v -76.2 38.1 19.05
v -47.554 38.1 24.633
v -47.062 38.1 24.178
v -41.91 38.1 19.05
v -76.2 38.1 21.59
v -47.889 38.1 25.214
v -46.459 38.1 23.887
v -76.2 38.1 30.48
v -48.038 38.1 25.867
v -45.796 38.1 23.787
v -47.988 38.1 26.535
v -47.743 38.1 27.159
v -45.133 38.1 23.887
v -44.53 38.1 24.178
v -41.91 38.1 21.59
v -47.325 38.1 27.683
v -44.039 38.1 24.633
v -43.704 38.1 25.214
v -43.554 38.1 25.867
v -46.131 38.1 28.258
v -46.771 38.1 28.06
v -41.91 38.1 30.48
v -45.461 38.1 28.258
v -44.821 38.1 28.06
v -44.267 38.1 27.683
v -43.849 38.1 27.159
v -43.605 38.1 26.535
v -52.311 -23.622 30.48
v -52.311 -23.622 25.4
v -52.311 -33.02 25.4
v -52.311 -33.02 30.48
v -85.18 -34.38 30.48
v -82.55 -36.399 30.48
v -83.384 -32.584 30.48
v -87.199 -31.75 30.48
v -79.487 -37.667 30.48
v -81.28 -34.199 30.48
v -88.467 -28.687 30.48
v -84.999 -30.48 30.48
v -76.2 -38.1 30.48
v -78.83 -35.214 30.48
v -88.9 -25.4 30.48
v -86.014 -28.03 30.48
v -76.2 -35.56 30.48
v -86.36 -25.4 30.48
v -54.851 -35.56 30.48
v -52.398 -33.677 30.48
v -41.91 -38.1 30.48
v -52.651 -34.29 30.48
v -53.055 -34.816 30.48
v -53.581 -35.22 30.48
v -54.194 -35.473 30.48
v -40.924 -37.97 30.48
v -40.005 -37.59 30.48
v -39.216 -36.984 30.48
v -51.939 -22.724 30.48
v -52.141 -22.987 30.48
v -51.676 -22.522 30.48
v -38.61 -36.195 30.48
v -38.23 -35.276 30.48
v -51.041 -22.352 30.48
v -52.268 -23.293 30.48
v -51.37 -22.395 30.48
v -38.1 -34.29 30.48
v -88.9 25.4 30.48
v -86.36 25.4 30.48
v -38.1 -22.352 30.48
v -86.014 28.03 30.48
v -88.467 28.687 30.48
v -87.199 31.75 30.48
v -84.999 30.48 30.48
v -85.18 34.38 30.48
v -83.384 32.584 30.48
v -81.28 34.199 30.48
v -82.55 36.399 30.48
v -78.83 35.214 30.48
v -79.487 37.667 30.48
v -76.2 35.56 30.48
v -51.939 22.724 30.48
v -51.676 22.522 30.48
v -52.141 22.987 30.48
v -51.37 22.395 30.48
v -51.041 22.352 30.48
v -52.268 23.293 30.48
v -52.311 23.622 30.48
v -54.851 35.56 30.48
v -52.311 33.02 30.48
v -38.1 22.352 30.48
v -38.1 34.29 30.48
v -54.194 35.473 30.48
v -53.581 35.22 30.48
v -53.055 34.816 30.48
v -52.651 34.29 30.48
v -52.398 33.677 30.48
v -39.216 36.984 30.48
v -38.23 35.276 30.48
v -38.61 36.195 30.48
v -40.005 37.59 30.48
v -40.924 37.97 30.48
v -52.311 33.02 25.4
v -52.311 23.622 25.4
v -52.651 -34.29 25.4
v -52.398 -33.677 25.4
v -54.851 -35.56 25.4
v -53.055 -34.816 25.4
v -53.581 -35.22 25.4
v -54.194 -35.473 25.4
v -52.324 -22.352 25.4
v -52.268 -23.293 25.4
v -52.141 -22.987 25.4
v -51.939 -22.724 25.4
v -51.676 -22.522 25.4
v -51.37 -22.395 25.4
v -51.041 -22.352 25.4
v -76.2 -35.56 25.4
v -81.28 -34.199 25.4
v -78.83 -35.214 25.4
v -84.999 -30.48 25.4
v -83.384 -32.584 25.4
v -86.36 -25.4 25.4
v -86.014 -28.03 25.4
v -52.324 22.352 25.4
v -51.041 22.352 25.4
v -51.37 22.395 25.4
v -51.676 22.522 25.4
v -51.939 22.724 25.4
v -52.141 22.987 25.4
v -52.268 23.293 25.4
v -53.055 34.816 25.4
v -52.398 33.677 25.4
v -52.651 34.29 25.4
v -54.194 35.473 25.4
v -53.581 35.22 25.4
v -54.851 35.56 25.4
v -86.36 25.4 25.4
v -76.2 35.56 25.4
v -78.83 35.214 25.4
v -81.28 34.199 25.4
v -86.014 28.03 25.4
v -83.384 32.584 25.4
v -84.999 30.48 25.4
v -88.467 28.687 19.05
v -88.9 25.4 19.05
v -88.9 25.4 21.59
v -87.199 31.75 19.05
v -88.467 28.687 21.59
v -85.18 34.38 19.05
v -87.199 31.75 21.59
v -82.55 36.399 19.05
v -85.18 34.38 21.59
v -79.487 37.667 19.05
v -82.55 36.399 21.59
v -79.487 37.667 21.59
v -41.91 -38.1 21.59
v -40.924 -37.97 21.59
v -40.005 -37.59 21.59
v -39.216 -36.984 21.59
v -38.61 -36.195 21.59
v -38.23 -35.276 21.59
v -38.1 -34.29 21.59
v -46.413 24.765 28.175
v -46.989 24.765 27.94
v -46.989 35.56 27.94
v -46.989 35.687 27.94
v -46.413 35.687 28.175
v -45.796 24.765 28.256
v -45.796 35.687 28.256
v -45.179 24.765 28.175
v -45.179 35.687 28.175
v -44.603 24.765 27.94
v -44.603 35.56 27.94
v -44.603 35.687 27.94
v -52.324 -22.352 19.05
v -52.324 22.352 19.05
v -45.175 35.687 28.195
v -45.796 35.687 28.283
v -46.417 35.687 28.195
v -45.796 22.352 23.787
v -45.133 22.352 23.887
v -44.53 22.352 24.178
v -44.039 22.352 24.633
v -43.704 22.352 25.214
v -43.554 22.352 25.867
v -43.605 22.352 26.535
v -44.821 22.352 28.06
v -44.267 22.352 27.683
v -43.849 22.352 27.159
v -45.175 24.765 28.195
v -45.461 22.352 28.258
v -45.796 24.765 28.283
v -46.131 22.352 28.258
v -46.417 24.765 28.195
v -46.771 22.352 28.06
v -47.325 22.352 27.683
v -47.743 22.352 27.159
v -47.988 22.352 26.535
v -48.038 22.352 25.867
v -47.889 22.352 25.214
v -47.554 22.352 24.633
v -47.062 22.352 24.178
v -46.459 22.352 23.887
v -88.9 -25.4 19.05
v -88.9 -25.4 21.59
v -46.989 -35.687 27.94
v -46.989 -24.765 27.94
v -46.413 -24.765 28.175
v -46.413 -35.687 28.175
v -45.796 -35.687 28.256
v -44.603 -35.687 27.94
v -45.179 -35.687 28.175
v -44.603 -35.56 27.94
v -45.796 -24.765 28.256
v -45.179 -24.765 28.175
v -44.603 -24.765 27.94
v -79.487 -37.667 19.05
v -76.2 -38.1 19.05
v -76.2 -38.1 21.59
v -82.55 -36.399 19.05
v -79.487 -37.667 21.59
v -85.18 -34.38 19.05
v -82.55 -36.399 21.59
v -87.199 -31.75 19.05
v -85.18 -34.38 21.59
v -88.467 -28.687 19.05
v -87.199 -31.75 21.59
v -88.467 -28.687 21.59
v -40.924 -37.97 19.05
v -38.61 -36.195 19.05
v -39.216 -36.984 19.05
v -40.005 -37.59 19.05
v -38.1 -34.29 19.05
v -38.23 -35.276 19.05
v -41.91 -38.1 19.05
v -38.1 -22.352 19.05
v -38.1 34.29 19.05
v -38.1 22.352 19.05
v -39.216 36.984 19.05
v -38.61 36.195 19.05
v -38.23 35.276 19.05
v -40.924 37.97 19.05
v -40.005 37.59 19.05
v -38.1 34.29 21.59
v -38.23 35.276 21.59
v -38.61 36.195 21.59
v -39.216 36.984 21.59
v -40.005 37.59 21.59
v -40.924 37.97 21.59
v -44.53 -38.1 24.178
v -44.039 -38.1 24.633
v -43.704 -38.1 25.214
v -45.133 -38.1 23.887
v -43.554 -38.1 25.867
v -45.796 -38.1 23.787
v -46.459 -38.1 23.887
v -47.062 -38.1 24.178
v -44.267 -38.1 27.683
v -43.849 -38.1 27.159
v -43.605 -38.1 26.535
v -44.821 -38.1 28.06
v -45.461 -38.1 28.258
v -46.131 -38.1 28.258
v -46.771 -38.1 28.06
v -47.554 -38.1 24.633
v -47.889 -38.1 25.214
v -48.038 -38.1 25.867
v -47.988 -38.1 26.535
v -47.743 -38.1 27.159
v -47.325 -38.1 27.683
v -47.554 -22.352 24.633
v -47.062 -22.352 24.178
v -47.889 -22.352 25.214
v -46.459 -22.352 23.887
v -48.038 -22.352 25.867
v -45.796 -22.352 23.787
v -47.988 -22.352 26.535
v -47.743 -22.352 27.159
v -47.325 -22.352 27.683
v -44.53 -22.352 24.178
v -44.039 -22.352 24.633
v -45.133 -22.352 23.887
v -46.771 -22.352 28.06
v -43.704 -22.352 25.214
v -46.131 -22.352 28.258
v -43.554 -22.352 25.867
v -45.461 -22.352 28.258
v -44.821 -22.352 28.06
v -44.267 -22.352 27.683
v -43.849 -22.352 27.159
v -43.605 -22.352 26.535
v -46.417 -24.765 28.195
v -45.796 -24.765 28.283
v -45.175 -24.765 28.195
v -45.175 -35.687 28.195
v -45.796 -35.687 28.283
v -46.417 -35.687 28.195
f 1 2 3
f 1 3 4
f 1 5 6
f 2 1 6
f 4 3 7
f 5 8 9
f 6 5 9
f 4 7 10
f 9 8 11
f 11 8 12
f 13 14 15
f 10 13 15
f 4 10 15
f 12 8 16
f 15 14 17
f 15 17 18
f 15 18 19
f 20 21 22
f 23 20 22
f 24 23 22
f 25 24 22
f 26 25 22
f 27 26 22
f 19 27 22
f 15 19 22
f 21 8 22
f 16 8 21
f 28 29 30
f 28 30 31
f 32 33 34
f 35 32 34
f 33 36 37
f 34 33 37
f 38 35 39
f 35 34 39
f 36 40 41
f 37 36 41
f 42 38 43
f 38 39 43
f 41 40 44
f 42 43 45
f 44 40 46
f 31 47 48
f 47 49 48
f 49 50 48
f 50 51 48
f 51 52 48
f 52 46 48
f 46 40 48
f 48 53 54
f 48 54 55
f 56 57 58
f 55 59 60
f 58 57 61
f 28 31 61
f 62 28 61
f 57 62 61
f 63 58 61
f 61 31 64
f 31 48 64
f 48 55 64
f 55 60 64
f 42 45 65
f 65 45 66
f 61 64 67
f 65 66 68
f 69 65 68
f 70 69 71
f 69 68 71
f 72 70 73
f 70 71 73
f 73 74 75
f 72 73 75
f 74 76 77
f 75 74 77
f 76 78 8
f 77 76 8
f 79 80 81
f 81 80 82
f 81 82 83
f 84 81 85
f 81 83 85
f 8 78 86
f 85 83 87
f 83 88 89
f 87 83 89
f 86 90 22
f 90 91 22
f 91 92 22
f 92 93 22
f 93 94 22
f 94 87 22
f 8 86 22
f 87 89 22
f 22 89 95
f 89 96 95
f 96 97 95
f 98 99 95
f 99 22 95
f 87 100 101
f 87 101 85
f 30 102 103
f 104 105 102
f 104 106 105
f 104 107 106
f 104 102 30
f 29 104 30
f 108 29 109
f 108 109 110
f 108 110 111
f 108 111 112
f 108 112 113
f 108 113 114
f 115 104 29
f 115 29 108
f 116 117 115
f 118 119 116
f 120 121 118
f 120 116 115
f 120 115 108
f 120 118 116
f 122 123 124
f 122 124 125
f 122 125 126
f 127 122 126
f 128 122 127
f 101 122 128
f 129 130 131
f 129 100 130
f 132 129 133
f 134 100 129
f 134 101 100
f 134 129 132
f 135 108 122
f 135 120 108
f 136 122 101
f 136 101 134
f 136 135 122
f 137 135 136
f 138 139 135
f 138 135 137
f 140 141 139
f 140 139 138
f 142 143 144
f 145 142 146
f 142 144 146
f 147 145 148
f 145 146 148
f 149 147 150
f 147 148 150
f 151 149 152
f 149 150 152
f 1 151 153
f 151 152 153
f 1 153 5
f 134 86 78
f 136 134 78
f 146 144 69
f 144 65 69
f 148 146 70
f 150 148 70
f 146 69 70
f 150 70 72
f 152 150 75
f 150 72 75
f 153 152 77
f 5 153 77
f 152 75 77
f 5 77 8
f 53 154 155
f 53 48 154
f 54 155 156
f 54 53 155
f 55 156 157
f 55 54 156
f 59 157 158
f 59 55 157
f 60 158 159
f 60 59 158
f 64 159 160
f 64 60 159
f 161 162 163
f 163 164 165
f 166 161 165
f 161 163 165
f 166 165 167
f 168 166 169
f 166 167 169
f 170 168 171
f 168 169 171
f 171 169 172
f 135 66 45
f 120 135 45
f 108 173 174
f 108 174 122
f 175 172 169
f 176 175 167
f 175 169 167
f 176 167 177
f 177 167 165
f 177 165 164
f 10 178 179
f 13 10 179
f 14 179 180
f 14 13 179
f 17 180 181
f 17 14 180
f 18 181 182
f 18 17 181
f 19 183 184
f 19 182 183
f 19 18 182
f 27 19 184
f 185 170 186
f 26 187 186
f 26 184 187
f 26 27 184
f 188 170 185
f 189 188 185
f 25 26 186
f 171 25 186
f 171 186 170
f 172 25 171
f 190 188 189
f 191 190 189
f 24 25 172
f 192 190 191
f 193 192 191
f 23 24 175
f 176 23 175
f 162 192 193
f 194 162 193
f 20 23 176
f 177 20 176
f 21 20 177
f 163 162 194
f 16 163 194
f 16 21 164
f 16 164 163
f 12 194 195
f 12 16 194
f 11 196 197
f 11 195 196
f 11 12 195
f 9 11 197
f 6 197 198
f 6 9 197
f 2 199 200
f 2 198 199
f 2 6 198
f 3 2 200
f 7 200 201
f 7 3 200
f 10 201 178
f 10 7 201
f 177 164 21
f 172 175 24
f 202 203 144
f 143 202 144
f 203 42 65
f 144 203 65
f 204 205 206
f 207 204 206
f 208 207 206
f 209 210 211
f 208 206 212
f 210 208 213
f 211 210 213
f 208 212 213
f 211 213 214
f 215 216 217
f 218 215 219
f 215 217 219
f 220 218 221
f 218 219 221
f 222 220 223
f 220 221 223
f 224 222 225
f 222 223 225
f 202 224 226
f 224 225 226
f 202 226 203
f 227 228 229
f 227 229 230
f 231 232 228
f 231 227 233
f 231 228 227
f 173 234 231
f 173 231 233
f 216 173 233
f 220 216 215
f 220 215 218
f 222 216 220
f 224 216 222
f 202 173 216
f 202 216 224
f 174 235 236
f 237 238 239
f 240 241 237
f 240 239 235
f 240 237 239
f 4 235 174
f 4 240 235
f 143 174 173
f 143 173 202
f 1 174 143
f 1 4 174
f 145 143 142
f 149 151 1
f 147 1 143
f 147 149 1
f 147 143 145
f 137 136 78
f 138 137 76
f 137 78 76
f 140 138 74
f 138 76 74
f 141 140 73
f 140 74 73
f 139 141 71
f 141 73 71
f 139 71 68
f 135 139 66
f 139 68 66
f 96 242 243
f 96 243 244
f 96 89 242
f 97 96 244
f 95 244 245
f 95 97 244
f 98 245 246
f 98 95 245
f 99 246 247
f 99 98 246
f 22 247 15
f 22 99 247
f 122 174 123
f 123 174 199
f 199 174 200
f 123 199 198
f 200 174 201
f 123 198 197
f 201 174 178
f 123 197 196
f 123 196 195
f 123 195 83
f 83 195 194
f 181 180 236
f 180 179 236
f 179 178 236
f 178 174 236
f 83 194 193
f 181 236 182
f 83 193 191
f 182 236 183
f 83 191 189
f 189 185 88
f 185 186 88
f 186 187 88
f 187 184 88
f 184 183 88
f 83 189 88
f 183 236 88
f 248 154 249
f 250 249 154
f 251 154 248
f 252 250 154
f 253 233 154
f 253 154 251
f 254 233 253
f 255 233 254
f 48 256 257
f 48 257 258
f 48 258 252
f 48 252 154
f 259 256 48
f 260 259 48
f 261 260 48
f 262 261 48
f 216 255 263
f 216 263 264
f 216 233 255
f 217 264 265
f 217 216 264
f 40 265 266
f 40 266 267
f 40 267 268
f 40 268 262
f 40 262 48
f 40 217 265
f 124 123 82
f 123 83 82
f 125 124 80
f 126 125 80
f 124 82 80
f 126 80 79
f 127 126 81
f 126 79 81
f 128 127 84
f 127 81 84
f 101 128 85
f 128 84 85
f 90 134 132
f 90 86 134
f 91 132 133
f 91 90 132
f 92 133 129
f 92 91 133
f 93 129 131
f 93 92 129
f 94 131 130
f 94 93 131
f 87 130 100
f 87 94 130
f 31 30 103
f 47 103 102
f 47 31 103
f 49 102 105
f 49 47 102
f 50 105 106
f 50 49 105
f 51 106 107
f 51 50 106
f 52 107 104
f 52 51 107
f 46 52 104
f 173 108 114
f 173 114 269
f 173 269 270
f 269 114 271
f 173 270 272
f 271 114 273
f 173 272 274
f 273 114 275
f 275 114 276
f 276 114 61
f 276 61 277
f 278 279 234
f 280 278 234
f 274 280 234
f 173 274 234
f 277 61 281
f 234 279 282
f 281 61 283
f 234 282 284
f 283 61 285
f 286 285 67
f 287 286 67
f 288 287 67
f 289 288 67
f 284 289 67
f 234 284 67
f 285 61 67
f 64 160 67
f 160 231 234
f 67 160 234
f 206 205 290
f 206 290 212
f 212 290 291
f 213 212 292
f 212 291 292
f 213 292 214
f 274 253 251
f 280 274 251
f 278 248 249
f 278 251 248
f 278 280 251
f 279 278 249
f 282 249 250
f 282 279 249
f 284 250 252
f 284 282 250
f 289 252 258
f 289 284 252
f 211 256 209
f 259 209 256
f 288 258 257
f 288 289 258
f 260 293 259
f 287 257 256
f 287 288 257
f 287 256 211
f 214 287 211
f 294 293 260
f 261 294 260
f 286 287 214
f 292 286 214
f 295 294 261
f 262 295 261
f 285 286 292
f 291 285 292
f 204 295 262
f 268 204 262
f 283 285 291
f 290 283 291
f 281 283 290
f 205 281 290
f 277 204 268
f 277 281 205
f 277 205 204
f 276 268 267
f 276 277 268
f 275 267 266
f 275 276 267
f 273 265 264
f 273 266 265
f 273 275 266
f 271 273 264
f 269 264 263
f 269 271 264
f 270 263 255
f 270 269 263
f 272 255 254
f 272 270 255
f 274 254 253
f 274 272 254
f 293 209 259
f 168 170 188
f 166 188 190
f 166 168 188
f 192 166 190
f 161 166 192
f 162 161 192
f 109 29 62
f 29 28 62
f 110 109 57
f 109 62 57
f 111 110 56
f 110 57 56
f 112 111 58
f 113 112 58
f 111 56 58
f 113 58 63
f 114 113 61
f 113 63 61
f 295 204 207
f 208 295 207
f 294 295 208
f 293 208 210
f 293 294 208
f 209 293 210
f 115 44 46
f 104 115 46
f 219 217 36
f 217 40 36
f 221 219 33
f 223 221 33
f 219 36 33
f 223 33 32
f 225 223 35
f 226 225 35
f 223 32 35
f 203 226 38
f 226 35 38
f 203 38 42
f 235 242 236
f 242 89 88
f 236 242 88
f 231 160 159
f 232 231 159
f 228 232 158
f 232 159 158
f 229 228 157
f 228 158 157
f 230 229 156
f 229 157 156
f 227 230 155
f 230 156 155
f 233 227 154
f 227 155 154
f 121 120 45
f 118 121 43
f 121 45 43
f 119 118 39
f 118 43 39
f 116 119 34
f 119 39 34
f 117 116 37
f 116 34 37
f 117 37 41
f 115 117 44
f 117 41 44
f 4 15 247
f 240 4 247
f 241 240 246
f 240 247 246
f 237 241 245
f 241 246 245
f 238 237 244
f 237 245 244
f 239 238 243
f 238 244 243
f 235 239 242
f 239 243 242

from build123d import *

# Parameters (mm, degrees)
SKETCH1_W                = 114.3
SKETCH1_H                = 44.45
BOSS_EXTRUDE1_DEPTH      = 62.23
SKETCH2_W                = 114.3
SKETCH2_H                = 30.050000124
CUT_EXTRUDE2_DEPTH       = 31.75
SKETCH3_W                = 114.3
SKETCH3_H                = 31.75
CUT_EXTRUDE3_DEPTH       = 21.59
CUT_EXTRUDE6_REACH       = 97.47
SKETCH7_R                = 4.8
CUT_EXTRUDE7_DEPTH       = 70.051688068
CUT_EXTRUDE7_DEPTH_BACK  = 70.051688068
SKETCH9_W                = 44.45
SKETCH9_H                = 30.050000124
CUT_EXTRUDE8_DEPTH       = 96.469879543
BOSS_EXTRUDE2_REACH      = 92.305
SKETCH14_W               = 21.59
SKETCH14_H               = 5.500000062
SKETCH17_W               = 44.45
SKETCH17_H               = 5.500000062
BOSS_EXTRUDE3_DEPTH      = 8.89
SKETCH20_W               = 50.8
SKETCH20_H               = 76.2
BOSS_EXTRUDE5_DEPTH      = 8.89
FILLET4_R                = 12.7
CUT_EXTRUDE10_DEPTH      = 2.54
CUT_EXTRUDE11_DEPTH      = 124.171316568
CUT_EXTRUDE11_DEPTH_BACK = 124.171316568
SKETCH22_R               = 4.8
SKETCH25_W               = 10.312122602
SKETCH25_H               = 7.199999938
CUT_EXTRUDE14_DEPTH      = 17.272
SKETCH26_W               = 10.312122602
SKETCH26_H               = 7.199999938
CUT_EXTRUDE15_DEPTH      = 17.272
CUT_EXTRUDE16_DEPTH      = 121.990414496
CUT_EXTRUDE16_DEPTH_BACK = 121.990414496
SKETCH32_R               = 2.2479
FILLET5_R                = 3.81
CUT_EXTRUDE22_DEPTH      = 98.128019129
BOSS_EXTRUDE6_DEPTH      = 10.922
BOSS_EXTRUDE7_START      = 10.922
BOSS_EXTRUDE7_DEPTH      = 10.922
BOSS_EXTRUDE8_DEPTH      = 2.54
CUT_EXTRUDE23_DEPTH      = 2.54
BOSS_EXTRUDE10_DEPTH     = 1.143
BOSS_EXTRUDE13_START     = -2.54
BOSS_EXTRUDE13_DEPTH     = 2.54
SKETCH59_W               = 5.08
SKETCH59_H               = 13.208
BOSS_EXTRUDE16_DEPTH     = 1.3589
FILLET6_R                = 2.54
FILLET7_R                = 1.27


with BuildPart() as part:
    # Sketch1 → Boss-Extrude1 (new body)
    with BuildSketch(Plane.XY):
        Rectangle(SKETCH1_W, SKETCH1_H)
    extrude(amount=BOSS_EXTRUDE1_DEPTH)

    # Sketch2 → Cut-Extrude2 (cut)
    with BuildSketch(Plane.XY.offset(62.23)):
        Rectangle(SKETCH2_W, SKETCH2_H)
    extrude(amount=-CUT_EXTRUDE2_DEPTH, mode=Mode.SUBTRACT)

    # Sketch3 → Cut-Extrude3 (cut)
    with BuildSketch(Plane(origin=(0, 0, 0), x_dir=(-1, 0, 0), z_dir=(0, 0, -1))):
        with Locations((0, 6.35)):
            Rectangle(SKETCH3_W, SKETCH3_H)
    extrude(amount=-CUT_EXTRUDE3_DEPTH, mode=Mode.SUBTRACT)

    # Cut-Extrude6: up to this face of the body (flat: up to its plane)
    cut_extrude6_end = Plane(part.part.faces().sort_by_distance((0, 22.225, 41.91))[0])
    # Sketch7 → Cut-Extrude6 (cut, up to the picked face)
    with BuildSketch(Plane.XZ.offset(22.225), mode=Mode.PRIVATE) as cut_extrude6_sk1:
        with Locations((31.75, 50.36)):
            Circle(SKETCH7_R)
    cut_extrude6_tool1 = split(extrude(cut_extrude6_sk1.sketch, amount=-CUT_EXTRUDE6_REACH, mode=Mode.PRIVATE), bisect_by=cut_extrude6_end, keep=Keep.BOTH, mode=Mode.PRIVATE)
    # Sketch7 → Cut-Extrude6 (cut, up to the picked face)
    with BuildSketch(Plane.XZ.offset(22.225), mode=Mode.PRIVATE) as cut_extrude6_sk2:
        with Locations((-27.14, 39.37)):
            Circle(SKETCH7_R)
    cut_extrude6_tool2 = split(extrude(cut_extrude6_sk2.sketch, amount=-CUT_EXTRUDE6_REACH, mode=Mode.PRIVATE), bisect_by=cut_extrude6_end, keep=Keep.BOTH, mode=Mode.PRIVATE)
    add(cut_extrude6_tool1.solids().sort_by(Axis((31.75, -22.225, 50.36), (0, 1, 0)))[0], mode=Mode.SUBTRACT)
    add(cut_extrude6_tool2.solids().sort_by(Axis((-27.14, -22.225, 39.37), (0, 1, 0)))[0], mode=Mode.SUBTRACT)

    # Sketch9 → Cut-Extrude7 (cut, two sides: drawn at the far end of the back side and taken through both)
    with BuildSketch(Plane.XY.offset(30.48).offset(-CUT_EXTRUDE7_DEPTH_BACK)):
        with Locations((-15.875, 0)):
            Rectangle(SKETCH9_W, SKETCH9_H)
    extrude(amount=CUT_EXTRUDE7_DEPTH + CUT_EXTRUDE7_DEPTH_BACK, mode=Mode.SUBTRACT)

    # Sketch16 → Cut-Extrude8 (cut, through all)
    with BuildSketch(Plane.XZ.offset(22.225)):
        with BuildLine():
            Line((-57.15, 62.23), (57.15, 62.23))
            Line((57.15, 62.23), (57.15, 47.010251521))
            Line((57.15, 47.010251521), (41.63, 50.36))
            ThreePointArc((41.63, 50.36), (31.75, 60.24), (21.87, 50.36))
            Line((21.87, 50.36), (-15.99, 39.37))
            ThreePointArc((-15.99, 39.37), (-26.807602145, 50.515044265), (-38.270181465, 40.034500235))
            ThreePointArc((-38.270181465, 40.034500235), (-41.445282487, 33.244816513), (-48.412122602, 30.48))
            Line((-48.412122602, 30.48), (-57.15, 30.48))
            Line((-57.15, 30.48), (-57.15, 62.23))
        make_face()
    extrude(amount=-CUT_EXTRUDE8_DEPTH, mode=Mode.SUBTRACT)

    # Sketch14 → Boss-Extrude2 (add, up to next)
    with BuildSketch(Plane.ZY.offset(-6.35), mode=Mode.PRIVATE) as boss_extrude2_sk1:
        with Locations((10.795, -12.275000031)):
            Rectangle(SKETCH14_W, SKETCH14_H)
    boss_extrude2_tool1 = extrude(boss_extrude2_sk1.sketch, amount=BOSS_EXTRUDE2_REACH, mode=Mode.PRIVATE) - part.part
    add(boss_extrude2_tool1.solids().sort_by_distance((6.35, -12.275, 10.795))[0])

    # Sketch17 → Boss-Extrude3 (add)
    with BuildSketch(Plane.XY.offset(21.59)):
        with Locations((-15.875, -12.275000031)):
            Rectangle(SKETCH17_W, SKETCH17_H)
    extrude(amount=BOSS_EXTRUDE3_DEPTH)

    # Sketch20 → Boss-Extrude5 (add)
    with BuildSketch(Plane(origin=(0, 0, 21.59), x_dir=(-1, 0, 0), z_dir=(0, 0, -1))):
        with Locations((63.5, 0)):
            Rectangle(SKETCH20_W, SKETCH20_H)
    extrude(amount=-BOSS_EXTRUDE5_DEPTH)

    # Fillet4
    fillet4_edges = [part.edges().sort_by_distance(p)[0] for p in [
        (-88.9, 38.1, 26.035),
        (-88.9, -38.1, 26.035),
    ]]
    fillet(fillet4_edges, radius=FILLET4_R)

    # Sketch21 → Cut-Extrude10 (cut)
    with BuildSketch(Plane.XY.offset(30.48)):
        with BuildLine():
            Line((-76.2, -35.56), (-40.64, -35.56))
            Line((-40.64, -35.56), (-40.64, -24.765))
            Line((-40.64, -24.765), (-50.952122602, -24.765))
            Line((-50.952122602, -24.765), (-50.952122602, -12.485000062))
            Line((-50.952122602, -12.485000062), (-40.64, -12.485000062))
            Line((-40.64, -12.485000062), (-40.64, -12.065))
            Line((-40.64, -12.065), (-40.64, 12.485000062))
            Line((-40.64, 12.485000062), (-50.952122602, 12.485000062))
            Line((-50.952122602, 12.485000062), (-50.952122602, 24.765))
            Line((-50.952122602, 24.765), (-40.64, 24.765))
            Line((-40.64, 24.765), (-40.64, 35.56))
            Line((-40.64, 35.56), (-76.2, 35.56))
            ThreePointArc((-76.2, 35.56), (-83.384204897, 32.584204897), (-86.36, 25.4))
            Line((-86.36, 25.4), (-86.36, -25.4))
            ThreePointArc((-86.36, -25.4), (-83.384204897, -32.584204897), (-76.2, -35.56))
        make_face()
    extrude(amount=-CUT_EXTRUDE10_DEPTH, mode=Mode.SUBTRACT)

    # Sketch22 → Cut-Extrude11 (cut, two sides: drawn at the far end of the back side and taken through both)
    with BuildSketch(Plane.XZ.offset(22.225).offset(-CUT_EXTRUDE11_DEPTH_BACK)):
        with BuildLine():
            Line((-38.1, 30.48), (-38.270181465, 40.034500235))
            ThreePointArc((-38.270181465, 40.034500235), (-26.807602145, 50.515044265), (-15.99, 39.37))
            Line((-15.99, 39.37), (21.87, 50.36))
            ThreePointArc((21.87, 50.36), (31.75, 60.24), (41.63, 50.36))
            Line((41.63, 50.36), (57.15, 47.010251521))
            Line((57.15, 47.010251521), (57.15, 0))
            Line((57.15, 0), (-57.15, 0))
            Line((-57.15, 0), (-57.15, 21.59))
            Line((-57.15, 21.59), (-38.1, 21.59))
            Line((-38.1, 21.59), (-38.1, 30.48))
        make_face()
        with Locations((31.75, 50.36)):
            Circle(SKETCH22_R, mode=Mode.SUBTRACT)
        with Locations((-27.14, 39.37)):
            Circle(SKETCH22_R, mode=Mode.SUBTRACT)
    extrude(amount=CUT_EXTRUDE11_DEPTH + CUT_EXTRUDE11_DEPTH_BACK, mode=Mode.SUBTRACT)

    # Sketch25 → Cut-Extrude14 (cut)
    with BuildSketch(Plane.XY.offset(30.48)):
        with Locations((-43.256061301, -18.625000031)):
            Rectangle(SKETCH25_W, SKETCH25_H)
    extrude(amount=CUT_EXTRUDE14_DEPTH, mode=Mode.SUBTRACT)

    # Sketch26 → Cut-Extrude15 (cut)
    with BuildSketch(Plane.XY.offset(30.48)):
        with Locations((-43.256061301, 18.625000031)):
            Rectangle(SKETCH26_W, SKETCH26_H)
    extrude(amount=CUT_EXTRUDE15_DEPTH, mode=Mode.SUBTRACT)

    # Sketch32 → Cut-Extrude16 (cut, two sides: drawn at the far end of the back side and taken through both)
    with BuildSketch(Plane.XZ.offset(38.1).offset(-CUT_EXTRUDE16_DEPTH_BACK)):
        with Locations(Location((-45.796061301, 26.035, 0), (0, 0, 270))):
            Circle(SKETCH32_R)
    extrude(amount=CUT_EXTRUDE16_DEPTH + CUT_EXTRUDE16_DEPTH_BACK, mode=Mode.SUBTRACT)

    # Fillet5
    fillet5_edges = [part.edges().sort_by_distance(p)[0] for p in [
        (-38.1, -38.1, 26.035),
        (-38.1, 38.1, 26.035),
    ]]
    fillet(fillet5_edges, radius=FILLET5_R)

    # Sketch33 → Cut-Extrude22 (cut, through all)
    with BuildSketch(Plane.XY.offset(30.48)):
        Polygon((-38.1, -22.352), (-38.1, 0), (-38.1, 22.352), (-53.467, 22.352), (-53.467, -22.352), align=None)
    extrude(amount=-CUT_EXTRUDE22_DEPTH, mode=Mode.SUBTRACT)

    # Sketch41 → Boss-Extrude6 (add)
    with BuildSketch(Plane.XZ.offset(24.765)):
        with BuildLine():
            Line((-44.602734267, 27.94), (-40.64, 27.94))
            Line((-40.64, 27.94), (-40.64, 30.48))
            Line((-40.64, 30.48), (-50.952122602, 30.48))
            Line((-50.952122602, 30.48), (-50.952122602, 27.94))
            Line((-50.952122602, 27.94), (-46.989388335, 27.94))
            ThreePointArc((-46.989388335, 27.94), (-45.796061301, 28.255730444), (-44.602734267, 27.94))
        make_face()
    extrude(amount=BOSS_EXTRUDE6_DEPTH)

    # Sketch44 → Boss-Extrude7 (add)
    with BuildSketch(Plane(origin=(0, 24.765, 0), x_dir=(1, 0, 0), z_dir=(0, 1, 0)).offset(BOSS_EXTRUDE7_START)):
        with BuildLine():
            Line((-44.602734267, -27.94), (-40.64, -27.94))
            Line((-40.64, -27.94), (-40.64, -30.48))
            Line((-40.64, -30.48), (-50.952122602, -30.48))
            Line((-50.952122602, -30.48), (-50.952122602, -27.94))
            Line((-50.952122602, -27.94), (-46.989388335, -27.94))
            ThreePointArc((-46.989388335, -27.94), (-45.796061301, -28.255730444), (-44.602734267, -27.94))
        make_face()
    extrude(amount=-BOSS_EXTRUDE7_DEPTH)

    # Sketch45 → Boss-Extrude8 (add)
    with BuildSketch(Plane(origin=(0, 0, 21.59), x_dir=(-1, 0, 0), z_dir=(0, 0, -1))):
        with BuildLine():
            Line((53.467, 22.352), (53.467, -22.352))
            Line((53.467, -22.352), (53.467, -38.1))
            Line((53.467, -38.1), (76.2, -38.1))
            ThreePointArc((76.2, -38.1), (85.180256121, -34.380256121), (88.9, -25.4))
            Line((88.9, -25.4), (88.9, 25.4))
            ThreePointArc((88.9, 25.4), (85.180256121, 34.380256121), (76.2, 38.1))
            Line((76.2, 38.1), (53.467, 38.1))
            Line((53.467, 38.1), (53.467, 22.352))
        make_face()
    extrude(amount=BOSS_EXTRUDE8_DEPTH)

    # Sketch47 → Cut-Extrude23 (cut)
    with BuildSketch(Plane.XY.offset(27.94)):
        with BuildLine():
            Line((-53.467, 22.352), (-53.467, -22.352))
            Line((-53.467, -22.352), (-50.952122602, -22.352))
            Line((-50.952122602, -22.352), (-50.952122602, -35.56))
            Line((-50.952122602, -35.56), (-76.2, -35.56))
            ThreePointArc((-76.2, -35.56), (-83.384204897, -32.584204897), (-86.36, -25.4))
            Line((-86.36, -25.4), (-86.36, 25.4))
            ThreePointArc((-86.36, 25.4), (-83.384204897, 32.584204897), (-76.2, 35.56))
            Line((-76.2, 35.56), (-50.952122602, 35.56))
            Line((-50.952122602, 35.56), (-50.952122602, 22.352))
            Line((-50.952122602, 22.352), (-53.467, 22.352))
        make_face()
    extrude(amount=-CUT_EXTRUDE23_DEPTH, mode=Mode.SUBTRACT)

    # Sketch49 → Boss-Extrude10 (add)
    with BuildSketch(Plane(origin=(-53.467, 0, 0), x_dir=(0, 0, -1), z_dir=(1, 0, 0))):
        Polygon((-21.59, 38.1), (-19.05, 38.1), (-19.05, -38.1), (-21.59, -38.1), (-21.59, -22.352), (-25.4, -22.352), (-25.4, 22.352), (-21.59, 22.352), align=None)
    extrude(amount=BOSS_EXTRUDE10_DEPTH)

    # Sketch54 → Boss-Extrude13 (add)
    with BuildSketch(Plane(origin=(0, 0, 19.05), x_dir=(-1, 0, 0), z_dir=(0, 0, -1)).offset(BOSS_EXTRUDE13_START)):
        with BuildLine():
            Line((38.1, 22.352), (52.324, 22.352))
            Line((52.324, 22.352), (52.324, 38.1))
            Line((52.324, 38.1), (41.91, 38.1))
            ThreePointArc((41.91, 38.1), (39.215923164, 36.984076836), (38.1, 34.29))
            Line((38.1, 34.29), (38.1, 22.352))
        make_face()
        with BuildLine():
            Line((41.91, -38.1), (52.324, -38.1))
            Line((52.324, -38.1), (52.324, -22.352))
            Line((52.324, -22.352), (38.1, -22.352))
            Line((38.1, -22.352), (38.1, -34.29))
            ThreePointArc((38.1, -34.29), (39.215923164, -36.984076836), (41.91, -38.1))
        make_face()
    extrude(amount=BOSS_EXTRUDE13_DEPTH)

    # Sketch59 → Boss-Extrude16 (add)
    with BuildSketch(Plane.ZY.offset(50.952122602)):
        with Locations((27.94, 28.956)):
            Rectangle(SKETCH59_W, SKETCH59_H)
        with Locations((27.94, -28.956)):
            Rectangle(SKETCH59_W, SKETCH59_H)
    extrude(amount=BOSS_EXTRUDE16_DEPTH)

    # Fillet6
    fillet6_edges = [part.edges().sort_by_distance(p)[0] for p in [
        (-52.311022602, 35.56, 27.94),
        (-52.311022602, -35.56, 27.94),
    ]]
    fillet(fillet6_edges, radius=FILLET6_R)

    # Fillet7
    fillet7_edges = [part.edges().sort_by_distance(p)[0] for p in [
        (-52.311022602, 22.352, 27.94),
        (-52.311022602, -22.352, 27.94),
    ]]
    fillet(fillet7_edges, radius=FILLET7_R)


solid = part.part
